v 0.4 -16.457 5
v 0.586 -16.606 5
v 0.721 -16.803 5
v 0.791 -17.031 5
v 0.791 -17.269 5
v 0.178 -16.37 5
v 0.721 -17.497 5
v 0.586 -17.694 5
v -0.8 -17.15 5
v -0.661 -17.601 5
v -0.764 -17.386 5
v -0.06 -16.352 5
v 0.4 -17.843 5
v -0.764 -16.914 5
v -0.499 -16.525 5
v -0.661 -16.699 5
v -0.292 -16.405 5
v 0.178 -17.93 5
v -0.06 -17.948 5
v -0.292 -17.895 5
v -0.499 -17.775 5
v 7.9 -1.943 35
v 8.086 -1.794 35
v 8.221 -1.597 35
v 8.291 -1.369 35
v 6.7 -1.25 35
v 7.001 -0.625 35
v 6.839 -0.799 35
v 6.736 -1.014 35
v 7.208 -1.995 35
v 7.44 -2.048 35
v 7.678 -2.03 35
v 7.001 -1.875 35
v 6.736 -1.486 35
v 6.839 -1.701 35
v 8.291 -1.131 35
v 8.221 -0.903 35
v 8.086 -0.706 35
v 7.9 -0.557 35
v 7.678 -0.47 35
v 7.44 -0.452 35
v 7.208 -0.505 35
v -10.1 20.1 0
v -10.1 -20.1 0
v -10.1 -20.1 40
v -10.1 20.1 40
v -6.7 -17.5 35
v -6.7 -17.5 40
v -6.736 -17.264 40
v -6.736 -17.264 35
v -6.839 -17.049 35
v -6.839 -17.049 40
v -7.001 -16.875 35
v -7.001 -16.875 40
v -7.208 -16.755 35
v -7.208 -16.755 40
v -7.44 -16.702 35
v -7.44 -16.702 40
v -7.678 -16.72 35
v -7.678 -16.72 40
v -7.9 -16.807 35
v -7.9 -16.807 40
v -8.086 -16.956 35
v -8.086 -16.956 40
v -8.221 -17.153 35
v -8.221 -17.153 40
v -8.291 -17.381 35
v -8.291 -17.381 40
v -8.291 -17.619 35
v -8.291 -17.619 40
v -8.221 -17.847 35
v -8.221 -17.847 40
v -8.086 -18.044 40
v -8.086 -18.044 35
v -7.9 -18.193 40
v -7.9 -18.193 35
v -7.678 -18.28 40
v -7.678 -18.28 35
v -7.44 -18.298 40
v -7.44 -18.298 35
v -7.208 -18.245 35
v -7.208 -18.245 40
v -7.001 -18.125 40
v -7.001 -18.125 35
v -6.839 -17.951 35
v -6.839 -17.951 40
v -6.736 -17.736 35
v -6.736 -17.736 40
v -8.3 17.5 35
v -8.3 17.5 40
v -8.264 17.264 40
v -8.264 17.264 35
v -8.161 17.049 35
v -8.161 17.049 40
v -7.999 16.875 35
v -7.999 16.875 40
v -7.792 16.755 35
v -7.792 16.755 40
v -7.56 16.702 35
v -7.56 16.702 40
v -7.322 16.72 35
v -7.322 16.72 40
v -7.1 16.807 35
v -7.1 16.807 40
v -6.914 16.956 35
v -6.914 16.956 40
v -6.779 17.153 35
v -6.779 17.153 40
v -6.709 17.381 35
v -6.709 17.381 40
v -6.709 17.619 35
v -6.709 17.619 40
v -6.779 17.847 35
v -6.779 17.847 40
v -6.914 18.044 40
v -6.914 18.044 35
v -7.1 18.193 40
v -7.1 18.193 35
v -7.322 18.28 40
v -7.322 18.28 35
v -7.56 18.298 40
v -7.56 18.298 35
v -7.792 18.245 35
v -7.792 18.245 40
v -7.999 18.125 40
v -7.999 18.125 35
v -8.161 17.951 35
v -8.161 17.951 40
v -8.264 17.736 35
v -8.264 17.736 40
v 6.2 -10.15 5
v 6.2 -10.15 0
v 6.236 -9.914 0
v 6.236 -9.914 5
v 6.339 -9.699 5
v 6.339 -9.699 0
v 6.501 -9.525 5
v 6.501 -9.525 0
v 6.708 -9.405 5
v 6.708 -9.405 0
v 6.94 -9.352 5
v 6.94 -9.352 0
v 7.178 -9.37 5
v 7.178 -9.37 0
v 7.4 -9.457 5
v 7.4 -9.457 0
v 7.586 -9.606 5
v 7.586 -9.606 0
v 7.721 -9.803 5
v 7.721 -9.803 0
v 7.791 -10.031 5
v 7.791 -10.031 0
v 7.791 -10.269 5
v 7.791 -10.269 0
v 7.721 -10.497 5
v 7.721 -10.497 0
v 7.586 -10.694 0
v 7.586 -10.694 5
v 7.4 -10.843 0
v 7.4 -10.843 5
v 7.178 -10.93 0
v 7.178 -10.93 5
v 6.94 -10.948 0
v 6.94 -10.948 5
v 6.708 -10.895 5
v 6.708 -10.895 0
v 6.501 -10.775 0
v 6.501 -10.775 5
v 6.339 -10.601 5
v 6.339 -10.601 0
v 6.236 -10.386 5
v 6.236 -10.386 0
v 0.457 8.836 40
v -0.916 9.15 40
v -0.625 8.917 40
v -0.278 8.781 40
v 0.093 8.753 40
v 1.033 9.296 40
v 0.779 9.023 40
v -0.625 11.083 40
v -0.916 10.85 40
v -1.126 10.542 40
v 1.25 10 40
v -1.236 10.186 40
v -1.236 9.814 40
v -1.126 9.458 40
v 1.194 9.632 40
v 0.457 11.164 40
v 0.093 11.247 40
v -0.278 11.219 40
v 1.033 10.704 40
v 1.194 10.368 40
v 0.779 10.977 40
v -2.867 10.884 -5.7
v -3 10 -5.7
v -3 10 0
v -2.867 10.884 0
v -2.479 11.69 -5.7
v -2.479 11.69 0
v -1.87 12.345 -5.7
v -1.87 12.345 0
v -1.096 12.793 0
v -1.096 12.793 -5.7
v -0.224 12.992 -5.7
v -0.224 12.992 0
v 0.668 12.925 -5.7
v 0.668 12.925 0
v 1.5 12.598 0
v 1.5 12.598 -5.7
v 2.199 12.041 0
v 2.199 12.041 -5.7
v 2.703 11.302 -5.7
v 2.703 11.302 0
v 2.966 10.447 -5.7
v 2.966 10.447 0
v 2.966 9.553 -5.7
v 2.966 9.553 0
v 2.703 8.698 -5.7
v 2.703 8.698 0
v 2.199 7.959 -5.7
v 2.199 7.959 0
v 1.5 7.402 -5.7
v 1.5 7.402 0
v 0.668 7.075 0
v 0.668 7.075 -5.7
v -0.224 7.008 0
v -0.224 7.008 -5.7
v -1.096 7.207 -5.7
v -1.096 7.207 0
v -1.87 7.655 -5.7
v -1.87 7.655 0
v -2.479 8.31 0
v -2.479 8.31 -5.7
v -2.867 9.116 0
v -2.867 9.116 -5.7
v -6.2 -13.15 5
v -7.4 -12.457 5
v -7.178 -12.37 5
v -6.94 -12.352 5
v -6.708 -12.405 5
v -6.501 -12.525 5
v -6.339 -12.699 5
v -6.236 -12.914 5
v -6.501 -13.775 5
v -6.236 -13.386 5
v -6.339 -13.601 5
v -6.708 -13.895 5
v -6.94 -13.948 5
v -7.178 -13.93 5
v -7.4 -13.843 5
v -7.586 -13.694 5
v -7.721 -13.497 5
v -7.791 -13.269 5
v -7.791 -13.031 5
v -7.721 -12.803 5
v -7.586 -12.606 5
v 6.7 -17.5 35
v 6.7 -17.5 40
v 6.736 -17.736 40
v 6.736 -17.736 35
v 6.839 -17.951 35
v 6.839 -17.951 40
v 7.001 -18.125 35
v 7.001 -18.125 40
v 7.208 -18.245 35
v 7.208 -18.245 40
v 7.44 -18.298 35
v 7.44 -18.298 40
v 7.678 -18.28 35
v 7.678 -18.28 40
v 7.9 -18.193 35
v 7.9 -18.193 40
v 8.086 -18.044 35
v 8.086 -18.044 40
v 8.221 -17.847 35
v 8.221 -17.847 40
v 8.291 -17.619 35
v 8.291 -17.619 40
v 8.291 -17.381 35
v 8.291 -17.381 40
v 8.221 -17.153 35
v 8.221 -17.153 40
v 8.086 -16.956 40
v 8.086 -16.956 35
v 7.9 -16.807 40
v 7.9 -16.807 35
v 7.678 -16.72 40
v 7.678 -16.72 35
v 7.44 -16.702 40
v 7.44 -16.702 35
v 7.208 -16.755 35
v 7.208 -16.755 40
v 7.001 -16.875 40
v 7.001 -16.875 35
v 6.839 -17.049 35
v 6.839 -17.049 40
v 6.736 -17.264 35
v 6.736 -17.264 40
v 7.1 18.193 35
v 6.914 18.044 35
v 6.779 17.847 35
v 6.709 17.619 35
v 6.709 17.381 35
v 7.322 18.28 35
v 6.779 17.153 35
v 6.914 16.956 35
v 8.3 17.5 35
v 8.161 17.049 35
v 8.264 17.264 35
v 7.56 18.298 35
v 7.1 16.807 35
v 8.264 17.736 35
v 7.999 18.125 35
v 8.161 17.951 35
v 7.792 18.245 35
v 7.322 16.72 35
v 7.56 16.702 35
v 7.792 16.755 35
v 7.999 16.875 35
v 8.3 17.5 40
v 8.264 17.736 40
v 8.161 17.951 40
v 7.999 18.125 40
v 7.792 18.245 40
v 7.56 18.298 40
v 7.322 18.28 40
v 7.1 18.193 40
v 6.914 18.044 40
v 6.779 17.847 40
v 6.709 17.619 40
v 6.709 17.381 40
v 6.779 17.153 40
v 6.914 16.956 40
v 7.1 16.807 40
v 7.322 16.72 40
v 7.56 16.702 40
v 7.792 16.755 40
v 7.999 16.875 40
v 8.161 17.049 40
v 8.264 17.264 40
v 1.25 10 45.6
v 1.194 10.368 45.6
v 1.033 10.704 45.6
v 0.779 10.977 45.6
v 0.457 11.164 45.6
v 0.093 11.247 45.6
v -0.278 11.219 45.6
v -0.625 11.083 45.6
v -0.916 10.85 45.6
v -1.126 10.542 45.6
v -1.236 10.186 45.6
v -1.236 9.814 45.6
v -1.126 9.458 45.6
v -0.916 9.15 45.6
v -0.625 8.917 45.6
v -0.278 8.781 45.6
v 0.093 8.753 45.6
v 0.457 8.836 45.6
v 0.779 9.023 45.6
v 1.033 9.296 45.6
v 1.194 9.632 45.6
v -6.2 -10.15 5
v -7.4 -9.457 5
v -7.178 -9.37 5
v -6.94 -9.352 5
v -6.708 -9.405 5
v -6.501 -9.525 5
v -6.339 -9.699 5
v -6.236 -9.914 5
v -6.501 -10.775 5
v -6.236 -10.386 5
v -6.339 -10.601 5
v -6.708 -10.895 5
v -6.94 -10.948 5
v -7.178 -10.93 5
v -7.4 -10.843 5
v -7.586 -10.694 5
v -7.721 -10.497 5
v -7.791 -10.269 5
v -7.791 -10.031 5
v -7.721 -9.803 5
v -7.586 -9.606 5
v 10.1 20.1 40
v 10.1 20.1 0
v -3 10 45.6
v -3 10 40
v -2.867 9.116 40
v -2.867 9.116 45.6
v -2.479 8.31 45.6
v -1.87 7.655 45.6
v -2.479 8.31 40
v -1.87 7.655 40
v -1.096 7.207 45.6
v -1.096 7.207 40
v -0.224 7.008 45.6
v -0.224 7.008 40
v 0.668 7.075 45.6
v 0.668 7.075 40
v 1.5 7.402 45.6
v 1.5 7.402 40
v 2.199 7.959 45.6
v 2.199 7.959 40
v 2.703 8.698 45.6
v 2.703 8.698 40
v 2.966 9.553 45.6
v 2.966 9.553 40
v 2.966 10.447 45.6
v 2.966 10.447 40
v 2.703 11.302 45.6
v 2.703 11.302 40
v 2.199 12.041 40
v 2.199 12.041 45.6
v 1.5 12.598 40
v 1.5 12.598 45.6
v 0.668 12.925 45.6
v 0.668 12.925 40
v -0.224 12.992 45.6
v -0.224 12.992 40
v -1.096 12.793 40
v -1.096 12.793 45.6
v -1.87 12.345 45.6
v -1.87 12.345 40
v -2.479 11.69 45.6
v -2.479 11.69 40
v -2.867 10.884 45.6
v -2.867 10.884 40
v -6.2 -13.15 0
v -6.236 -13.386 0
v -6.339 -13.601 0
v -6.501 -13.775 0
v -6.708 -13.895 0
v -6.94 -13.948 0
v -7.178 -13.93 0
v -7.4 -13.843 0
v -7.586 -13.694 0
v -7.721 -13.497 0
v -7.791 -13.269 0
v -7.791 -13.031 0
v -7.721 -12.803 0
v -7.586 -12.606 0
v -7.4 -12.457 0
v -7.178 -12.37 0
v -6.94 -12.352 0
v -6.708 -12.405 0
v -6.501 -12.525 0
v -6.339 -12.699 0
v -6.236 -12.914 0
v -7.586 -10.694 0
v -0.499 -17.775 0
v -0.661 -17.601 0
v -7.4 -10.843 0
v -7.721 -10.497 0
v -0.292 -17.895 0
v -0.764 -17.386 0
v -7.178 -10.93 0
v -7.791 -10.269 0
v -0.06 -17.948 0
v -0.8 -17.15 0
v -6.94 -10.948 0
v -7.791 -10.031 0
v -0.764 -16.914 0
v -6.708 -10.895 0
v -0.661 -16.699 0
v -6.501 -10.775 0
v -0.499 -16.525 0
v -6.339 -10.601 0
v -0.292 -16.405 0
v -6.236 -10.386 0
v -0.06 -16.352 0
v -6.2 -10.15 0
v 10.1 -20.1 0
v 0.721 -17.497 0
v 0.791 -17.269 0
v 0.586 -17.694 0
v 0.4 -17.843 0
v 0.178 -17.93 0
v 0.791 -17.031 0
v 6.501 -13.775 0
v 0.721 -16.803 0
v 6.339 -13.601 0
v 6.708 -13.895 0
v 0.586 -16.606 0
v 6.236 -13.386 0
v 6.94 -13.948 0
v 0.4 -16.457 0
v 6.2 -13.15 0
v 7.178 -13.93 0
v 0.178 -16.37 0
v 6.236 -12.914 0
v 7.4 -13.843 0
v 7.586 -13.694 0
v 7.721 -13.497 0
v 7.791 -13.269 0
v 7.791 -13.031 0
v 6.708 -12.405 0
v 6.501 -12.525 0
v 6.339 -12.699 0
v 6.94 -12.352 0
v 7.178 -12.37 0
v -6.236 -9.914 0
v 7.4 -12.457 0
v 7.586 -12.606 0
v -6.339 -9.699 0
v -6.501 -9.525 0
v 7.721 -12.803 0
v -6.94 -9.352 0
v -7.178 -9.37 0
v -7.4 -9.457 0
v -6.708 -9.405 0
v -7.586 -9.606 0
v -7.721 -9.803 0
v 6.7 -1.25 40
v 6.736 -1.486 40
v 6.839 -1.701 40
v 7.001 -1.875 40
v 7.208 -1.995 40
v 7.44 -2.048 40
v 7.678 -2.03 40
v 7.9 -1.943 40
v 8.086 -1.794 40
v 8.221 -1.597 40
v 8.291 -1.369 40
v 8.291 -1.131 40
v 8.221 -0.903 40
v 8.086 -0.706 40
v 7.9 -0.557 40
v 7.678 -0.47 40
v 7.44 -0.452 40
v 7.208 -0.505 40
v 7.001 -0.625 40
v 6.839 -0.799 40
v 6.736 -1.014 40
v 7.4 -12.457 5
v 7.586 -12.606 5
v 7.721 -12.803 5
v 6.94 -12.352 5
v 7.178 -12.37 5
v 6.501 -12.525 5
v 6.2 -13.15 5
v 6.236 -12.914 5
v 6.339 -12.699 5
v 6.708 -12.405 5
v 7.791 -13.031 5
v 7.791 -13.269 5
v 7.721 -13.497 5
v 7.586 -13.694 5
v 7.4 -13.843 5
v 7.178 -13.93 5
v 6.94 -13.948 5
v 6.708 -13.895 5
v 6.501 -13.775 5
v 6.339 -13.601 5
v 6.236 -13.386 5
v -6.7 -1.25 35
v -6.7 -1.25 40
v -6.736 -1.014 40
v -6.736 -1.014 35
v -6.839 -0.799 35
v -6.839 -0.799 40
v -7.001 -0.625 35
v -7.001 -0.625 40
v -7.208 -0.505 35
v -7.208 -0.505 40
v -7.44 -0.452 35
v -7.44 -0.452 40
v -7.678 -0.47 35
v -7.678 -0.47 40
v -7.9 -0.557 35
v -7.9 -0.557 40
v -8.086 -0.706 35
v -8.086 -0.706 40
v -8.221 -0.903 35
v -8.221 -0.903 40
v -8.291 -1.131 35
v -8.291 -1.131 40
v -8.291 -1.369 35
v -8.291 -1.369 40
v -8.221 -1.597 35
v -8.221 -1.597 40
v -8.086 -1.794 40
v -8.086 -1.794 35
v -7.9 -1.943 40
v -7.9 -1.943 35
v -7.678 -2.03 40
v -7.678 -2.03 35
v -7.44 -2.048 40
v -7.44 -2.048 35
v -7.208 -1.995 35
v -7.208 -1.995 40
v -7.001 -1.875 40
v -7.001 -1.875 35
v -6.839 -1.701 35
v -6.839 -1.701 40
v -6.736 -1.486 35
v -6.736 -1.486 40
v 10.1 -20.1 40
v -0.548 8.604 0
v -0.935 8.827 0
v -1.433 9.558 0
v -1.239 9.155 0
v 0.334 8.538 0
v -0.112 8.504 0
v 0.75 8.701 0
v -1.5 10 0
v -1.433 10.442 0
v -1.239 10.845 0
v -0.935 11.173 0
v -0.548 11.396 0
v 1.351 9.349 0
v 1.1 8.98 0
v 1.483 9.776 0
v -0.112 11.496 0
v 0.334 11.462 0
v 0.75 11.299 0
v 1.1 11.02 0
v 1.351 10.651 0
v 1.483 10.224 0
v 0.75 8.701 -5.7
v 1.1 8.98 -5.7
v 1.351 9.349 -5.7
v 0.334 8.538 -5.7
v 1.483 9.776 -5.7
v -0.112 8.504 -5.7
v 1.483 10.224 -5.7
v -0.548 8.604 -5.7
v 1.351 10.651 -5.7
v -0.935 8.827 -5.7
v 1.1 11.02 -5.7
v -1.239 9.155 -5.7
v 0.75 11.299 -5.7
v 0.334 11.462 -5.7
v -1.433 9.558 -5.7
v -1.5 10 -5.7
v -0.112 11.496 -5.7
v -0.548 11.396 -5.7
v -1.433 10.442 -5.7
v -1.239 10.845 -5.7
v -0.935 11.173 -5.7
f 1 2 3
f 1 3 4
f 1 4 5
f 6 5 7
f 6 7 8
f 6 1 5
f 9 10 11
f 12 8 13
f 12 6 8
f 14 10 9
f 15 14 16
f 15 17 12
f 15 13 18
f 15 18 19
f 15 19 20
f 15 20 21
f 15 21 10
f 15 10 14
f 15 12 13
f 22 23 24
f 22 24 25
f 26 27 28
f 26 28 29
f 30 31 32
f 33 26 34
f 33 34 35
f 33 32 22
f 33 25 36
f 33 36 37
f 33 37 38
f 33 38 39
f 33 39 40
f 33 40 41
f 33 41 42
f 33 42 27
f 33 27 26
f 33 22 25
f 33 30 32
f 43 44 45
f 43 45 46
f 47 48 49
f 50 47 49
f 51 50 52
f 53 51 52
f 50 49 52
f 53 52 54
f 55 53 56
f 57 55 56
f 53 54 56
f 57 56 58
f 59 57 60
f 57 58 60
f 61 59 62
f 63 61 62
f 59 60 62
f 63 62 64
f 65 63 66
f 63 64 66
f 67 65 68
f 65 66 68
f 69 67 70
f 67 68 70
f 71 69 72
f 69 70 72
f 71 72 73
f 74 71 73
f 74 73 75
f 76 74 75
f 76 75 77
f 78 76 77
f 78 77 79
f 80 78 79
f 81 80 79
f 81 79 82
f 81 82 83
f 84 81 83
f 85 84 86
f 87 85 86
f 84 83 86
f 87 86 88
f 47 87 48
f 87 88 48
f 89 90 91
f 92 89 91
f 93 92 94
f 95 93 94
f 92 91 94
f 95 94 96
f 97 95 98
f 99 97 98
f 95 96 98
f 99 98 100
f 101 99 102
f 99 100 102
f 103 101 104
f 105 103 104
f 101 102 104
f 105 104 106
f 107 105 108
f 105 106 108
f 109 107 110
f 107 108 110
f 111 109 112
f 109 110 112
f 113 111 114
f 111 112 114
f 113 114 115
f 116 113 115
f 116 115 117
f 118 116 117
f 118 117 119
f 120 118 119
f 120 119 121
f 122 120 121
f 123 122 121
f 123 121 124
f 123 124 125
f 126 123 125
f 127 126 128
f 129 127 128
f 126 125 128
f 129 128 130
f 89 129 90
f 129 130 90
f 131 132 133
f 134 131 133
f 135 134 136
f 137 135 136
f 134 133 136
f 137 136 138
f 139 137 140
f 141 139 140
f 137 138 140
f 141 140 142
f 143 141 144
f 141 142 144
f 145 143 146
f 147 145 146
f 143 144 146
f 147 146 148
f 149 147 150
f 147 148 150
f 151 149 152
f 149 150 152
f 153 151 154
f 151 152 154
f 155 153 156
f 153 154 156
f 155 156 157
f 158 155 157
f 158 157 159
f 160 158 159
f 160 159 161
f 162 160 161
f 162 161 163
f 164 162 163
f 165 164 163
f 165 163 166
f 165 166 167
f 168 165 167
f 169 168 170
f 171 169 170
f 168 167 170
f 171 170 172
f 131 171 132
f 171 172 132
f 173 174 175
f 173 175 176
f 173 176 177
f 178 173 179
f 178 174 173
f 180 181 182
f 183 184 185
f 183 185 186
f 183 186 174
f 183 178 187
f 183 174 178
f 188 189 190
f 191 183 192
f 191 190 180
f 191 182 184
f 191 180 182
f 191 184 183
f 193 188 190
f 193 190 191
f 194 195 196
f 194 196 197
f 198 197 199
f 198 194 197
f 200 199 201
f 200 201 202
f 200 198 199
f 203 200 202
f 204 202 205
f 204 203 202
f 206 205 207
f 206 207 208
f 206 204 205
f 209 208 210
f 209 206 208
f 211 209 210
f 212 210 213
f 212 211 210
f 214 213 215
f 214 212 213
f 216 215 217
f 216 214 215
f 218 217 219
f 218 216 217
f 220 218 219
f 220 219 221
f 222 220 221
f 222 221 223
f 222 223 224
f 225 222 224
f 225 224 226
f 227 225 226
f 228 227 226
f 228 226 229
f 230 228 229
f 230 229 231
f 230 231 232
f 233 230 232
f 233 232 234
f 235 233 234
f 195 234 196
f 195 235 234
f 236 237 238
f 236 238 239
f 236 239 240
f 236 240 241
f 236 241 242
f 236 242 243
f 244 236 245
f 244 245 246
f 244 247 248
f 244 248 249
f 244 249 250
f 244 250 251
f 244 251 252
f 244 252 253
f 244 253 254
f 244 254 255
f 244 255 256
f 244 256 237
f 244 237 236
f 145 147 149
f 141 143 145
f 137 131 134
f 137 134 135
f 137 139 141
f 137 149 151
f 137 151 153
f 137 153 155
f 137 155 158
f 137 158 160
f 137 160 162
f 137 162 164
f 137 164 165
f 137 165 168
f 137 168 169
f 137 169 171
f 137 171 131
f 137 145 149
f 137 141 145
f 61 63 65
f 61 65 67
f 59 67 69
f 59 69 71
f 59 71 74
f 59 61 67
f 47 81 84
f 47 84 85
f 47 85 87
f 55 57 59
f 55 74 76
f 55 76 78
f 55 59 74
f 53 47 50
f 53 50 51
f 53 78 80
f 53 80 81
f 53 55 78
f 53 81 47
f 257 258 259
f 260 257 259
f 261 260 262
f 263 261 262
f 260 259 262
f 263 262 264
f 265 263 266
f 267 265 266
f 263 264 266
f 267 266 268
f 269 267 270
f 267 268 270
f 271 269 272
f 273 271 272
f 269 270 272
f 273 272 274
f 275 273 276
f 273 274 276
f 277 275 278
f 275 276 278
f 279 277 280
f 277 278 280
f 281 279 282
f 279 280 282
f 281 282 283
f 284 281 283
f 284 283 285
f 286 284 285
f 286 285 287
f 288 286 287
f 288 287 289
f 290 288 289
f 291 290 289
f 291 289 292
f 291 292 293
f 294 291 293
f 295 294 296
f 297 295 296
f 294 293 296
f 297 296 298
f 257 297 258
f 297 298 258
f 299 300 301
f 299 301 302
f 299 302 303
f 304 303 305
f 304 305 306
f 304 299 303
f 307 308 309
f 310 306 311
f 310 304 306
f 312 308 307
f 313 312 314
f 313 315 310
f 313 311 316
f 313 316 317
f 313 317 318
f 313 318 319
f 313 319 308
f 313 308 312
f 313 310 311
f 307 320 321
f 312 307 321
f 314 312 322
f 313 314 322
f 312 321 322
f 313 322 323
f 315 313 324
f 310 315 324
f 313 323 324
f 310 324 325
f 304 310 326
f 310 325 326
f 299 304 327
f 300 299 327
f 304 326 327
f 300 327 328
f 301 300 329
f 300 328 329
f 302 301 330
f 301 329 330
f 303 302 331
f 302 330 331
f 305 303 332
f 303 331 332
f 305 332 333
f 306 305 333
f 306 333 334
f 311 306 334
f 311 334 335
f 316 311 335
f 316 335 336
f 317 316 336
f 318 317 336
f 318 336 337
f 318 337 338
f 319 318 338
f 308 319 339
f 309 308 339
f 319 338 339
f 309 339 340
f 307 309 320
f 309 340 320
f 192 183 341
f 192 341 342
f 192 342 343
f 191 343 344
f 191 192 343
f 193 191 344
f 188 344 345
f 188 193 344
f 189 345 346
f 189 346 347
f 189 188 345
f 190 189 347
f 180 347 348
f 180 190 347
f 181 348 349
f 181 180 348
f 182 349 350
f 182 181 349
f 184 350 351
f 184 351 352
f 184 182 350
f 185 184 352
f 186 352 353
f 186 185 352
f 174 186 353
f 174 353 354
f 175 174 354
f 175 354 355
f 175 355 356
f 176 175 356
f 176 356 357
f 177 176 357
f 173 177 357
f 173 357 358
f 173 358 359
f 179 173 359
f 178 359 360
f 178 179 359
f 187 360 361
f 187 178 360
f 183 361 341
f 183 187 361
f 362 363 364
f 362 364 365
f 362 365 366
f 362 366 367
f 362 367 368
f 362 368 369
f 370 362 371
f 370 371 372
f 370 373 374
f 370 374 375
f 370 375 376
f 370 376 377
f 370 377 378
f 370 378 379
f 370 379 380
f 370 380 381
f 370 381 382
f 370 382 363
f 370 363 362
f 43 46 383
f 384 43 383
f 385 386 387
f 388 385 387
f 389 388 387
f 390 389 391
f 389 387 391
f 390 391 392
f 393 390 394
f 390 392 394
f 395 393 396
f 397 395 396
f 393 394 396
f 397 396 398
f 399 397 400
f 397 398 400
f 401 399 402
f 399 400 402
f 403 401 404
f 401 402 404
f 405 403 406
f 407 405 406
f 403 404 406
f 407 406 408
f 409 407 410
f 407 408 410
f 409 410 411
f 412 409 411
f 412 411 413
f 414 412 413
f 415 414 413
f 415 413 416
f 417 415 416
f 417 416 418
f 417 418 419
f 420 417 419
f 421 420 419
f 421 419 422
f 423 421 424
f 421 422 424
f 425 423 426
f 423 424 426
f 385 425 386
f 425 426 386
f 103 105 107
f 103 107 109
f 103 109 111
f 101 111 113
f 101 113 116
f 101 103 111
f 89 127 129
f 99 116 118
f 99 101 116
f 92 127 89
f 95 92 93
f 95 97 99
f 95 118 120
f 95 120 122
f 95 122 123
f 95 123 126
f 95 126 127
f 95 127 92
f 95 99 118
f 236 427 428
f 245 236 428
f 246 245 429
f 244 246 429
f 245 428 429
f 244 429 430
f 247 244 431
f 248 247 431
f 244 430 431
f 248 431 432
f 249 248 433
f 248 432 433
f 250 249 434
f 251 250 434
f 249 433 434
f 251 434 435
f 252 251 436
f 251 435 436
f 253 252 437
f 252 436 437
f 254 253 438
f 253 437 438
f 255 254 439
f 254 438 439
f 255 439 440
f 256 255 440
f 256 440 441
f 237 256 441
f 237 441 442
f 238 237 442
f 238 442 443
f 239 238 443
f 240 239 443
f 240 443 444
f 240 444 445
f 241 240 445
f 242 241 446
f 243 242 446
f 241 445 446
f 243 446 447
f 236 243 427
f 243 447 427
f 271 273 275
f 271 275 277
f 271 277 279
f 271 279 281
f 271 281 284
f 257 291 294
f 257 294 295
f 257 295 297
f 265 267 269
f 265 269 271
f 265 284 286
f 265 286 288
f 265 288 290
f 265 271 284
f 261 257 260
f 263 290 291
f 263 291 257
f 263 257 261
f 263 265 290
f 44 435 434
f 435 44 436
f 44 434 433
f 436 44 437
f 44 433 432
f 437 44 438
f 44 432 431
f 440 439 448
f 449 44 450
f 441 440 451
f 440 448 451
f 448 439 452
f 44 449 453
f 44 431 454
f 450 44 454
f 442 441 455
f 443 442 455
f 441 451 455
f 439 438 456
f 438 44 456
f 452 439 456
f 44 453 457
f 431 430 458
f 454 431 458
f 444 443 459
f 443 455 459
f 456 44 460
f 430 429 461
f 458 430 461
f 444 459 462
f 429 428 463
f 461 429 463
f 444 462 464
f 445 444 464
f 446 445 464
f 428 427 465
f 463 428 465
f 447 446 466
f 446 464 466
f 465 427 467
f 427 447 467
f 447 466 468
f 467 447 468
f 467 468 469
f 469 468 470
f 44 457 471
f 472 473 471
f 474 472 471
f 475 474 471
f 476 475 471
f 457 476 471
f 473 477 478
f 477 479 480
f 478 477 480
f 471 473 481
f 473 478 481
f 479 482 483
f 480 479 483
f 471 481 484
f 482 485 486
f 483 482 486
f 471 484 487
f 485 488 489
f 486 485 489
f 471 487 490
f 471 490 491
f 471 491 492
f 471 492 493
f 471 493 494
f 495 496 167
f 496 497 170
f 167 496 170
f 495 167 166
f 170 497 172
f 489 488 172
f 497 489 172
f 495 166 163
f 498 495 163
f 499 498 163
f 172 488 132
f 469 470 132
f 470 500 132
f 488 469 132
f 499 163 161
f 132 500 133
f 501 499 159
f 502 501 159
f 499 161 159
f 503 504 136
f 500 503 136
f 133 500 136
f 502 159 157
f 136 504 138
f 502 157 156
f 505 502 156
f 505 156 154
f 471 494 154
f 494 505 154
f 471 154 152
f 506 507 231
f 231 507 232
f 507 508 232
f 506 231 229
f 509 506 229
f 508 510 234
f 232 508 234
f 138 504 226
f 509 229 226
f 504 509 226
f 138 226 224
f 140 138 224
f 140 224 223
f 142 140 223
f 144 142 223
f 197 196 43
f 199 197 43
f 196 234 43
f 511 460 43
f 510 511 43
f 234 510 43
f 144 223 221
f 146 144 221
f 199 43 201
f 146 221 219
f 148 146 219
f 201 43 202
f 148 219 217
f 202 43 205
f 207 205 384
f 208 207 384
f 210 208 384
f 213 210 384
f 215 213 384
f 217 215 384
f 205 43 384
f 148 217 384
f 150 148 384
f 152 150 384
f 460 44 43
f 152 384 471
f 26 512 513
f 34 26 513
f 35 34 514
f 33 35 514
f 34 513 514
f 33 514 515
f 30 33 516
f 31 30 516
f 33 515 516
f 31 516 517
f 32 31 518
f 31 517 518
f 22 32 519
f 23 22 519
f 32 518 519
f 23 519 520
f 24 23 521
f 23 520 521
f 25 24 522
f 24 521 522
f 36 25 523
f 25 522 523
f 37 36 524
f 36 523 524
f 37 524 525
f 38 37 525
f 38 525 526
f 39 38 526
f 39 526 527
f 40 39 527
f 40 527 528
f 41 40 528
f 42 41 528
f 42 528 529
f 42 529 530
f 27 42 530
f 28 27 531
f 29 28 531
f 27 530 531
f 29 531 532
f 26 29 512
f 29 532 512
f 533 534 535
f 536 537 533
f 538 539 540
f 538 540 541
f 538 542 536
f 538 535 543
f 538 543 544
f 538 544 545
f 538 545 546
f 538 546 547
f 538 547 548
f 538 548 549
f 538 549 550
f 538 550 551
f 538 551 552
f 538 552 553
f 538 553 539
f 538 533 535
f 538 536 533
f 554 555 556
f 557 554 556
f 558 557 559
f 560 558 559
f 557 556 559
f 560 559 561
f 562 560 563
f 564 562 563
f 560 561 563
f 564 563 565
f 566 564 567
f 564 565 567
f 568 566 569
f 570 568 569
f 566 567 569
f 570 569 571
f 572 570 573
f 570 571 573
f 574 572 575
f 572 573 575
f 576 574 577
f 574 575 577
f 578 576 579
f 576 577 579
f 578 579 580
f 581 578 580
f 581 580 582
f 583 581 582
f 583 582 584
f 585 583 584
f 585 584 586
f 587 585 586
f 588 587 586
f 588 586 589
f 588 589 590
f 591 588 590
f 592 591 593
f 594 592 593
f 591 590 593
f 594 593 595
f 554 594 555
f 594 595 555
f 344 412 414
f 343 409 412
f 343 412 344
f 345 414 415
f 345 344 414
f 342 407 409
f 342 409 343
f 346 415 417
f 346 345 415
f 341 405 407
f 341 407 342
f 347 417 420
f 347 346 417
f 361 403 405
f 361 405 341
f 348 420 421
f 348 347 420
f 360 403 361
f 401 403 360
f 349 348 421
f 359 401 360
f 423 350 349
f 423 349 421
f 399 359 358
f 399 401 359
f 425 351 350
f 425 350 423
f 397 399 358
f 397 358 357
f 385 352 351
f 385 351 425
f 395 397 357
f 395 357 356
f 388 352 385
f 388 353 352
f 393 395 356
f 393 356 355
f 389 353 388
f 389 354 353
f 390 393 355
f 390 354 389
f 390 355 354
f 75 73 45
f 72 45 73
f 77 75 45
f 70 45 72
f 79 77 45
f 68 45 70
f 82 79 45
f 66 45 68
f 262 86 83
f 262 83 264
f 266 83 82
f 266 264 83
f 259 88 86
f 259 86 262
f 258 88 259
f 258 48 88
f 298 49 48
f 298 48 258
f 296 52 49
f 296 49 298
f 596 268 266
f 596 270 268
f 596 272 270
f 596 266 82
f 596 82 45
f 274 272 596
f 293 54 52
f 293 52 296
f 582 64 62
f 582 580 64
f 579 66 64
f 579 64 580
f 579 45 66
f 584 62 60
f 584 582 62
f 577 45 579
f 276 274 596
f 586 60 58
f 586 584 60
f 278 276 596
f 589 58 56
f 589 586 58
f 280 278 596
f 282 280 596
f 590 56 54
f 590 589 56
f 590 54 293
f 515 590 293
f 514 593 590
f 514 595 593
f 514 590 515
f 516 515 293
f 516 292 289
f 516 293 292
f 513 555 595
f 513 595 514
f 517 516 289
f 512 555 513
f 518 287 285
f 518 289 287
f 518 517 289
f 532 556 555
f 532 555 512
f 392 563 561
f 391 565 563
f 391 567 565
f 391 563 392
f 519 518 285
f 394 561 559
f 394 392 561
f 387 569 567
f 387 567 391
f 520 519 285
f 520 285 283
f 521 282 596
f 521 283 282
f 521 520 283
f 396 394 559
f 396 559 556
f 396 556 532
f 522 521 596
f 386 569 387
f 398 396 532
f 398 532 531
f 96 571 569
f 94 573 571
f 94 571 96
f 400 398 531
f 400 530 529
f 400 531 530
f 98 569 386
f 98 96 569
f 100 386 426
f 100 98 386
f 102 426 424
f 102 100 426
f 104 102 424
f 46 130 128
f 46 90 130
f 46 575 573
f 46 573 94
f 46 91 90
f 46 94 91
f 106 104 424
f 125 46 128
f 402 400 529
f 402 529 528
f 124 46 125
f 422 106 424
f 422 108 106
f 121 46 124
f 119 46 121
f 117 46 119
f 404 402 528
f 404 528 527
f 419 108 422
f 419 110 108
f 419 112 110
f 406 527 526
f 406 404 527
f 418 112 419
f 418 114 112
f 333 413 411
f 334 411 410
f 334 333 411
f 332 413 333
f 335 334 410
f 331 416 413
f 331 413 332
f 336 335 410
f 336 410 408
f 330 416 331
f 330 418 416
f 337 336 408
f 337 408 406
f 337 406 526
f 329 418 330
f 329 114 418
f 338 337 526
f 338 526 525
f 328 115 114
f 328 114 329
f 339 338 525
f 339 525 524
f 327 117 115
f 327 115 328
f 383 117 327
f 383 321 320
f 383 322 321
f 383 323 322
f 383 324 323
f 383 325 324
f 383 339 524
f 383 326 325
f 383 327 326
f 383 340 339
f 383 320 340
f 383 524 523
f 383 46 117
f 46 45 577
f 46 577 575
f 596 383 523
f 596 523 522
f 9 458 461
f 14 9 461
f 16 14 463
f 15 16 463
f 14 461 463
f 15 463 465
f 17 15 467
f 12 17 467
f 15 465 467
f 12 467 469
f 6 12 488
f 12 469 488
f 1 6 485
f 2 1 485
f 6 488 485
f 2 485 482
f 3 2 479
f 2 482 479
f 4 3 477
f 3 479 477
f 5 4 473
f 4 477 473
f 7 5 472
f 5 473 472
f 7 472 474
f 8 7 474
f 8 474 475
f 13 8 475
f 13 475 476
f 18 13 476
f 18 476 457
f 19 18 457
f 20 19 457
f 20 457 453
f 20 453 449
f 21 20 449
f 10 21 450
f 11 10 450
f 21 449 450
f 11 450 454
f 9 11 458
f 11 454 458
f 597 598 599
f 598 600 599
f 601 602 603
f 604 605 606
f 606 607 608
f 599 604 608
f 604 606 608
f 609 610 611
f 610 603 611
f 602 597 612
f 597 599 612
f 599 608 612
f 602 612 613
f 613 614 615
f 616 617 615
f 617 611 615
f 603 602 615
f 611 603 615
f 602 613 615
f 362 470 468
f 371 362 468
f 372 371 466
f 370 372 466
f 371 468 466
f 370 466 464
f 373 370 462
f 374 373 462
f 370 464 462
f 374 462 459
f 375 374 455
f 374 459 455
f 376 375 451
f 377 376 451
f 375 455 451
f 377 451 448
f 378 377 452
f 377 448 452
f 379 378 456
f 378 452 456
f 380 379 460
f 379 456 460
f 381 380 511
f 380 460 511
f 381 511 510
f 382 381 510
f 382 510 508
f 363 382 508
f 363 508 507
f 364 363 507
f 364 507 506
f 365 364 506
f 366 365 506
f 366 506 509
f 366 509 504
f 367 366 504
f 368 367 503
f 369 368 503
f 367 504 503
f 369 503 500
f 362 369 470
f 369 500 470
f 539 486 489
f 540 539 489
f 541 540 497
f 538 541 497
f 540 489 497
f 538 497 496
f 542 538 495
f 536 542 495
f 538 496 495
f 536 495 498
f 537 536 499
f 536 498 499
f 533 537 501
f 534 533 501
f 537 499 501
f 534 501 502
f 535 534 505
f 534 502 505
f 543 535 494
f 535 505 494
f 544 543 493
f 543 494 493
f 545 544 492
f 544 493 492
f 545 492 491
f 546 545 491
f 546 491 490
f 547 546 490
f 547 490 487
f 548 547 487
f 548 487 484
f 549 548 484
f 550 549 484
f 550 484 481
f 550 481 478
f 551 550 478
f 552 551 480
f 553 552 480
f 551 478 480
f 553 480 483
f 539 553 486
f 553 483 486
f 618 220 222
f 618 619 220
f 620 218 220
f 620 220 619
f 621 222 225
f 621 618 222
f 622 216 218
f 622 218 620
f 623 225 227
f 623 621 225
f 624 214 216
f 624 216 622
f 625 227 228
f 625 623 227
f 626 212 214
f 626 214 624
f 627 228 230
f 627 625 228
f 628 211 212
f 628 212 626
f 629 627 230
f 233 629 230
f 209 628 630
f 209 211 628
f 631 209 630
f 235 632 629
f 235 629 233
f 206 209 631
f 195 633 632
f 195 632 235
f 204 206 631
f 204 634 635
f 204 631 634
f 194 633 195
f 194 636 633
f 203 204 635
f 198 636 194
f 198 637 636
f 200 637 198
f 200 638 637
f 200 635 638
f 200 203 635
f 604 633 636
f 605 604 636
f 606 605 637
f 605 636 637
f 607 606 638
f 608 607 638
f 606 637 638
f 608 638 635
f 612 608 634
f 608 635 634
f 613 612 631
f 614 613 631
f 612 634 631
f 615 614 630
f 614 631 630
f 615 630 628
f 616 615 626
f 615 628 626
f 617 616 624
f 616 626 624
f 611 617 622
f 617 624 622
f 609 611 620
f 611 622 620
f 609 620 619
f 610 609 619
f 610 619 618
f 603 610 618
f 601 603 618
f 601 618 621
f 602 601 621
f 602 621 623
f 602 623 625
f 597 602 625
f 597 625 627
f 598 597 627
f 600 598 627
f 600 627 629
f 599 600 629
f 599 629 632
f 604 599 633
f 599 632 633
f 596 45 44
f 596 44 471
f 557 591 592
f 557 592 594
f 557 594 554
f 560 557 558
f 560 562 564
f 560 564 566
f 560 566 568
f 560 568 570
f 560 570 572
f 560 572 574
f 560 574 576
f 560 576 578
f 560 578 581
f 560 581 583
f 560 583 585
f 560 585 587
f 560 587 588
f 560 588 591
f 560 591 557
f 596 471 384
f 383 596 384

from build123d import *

# Parameters (mm, degrees)
SKETCH1_W           = 20.2
SKETCH1_H           = 40.2
BOSS_EXTRUDE1_DEPTH = 40
SKETCH2_R           = 0.8
CUT_EXTRUDE1_DEPTH  = 5
SKETCH3_R           = 3
SKETCH3_R_2         = 1.25
BOSS_EXTRUDE2_DEPTH = 5.6
BOSS_EXTRUDE3_START = 5.7
SKETCH4_R           = 3
SKETCH4_R_2         = 1.5
BOSS_EXTRUDE3_DEPTH = 5.7
SKETCH5_R           = 0.8
CUT_EXTRUDE2_DEPTH  = 5


with BuildPart() as part:
    # Sketch1 → Boss-Extrude1 (new body)
    with BuildSketch(Plane.XY):
        Rectangle(SKETCH1_W, SKETCH1_H)
    extrude(amount=BOSS_EXTRUDE1_DEPTH)

    # Sketch2 → Cut-Extrude1 (cut)
    with BuildSketch(Plane.XY.offset(40)):
        with Locations((-7.5, -17.5)):
            Circle(SKETCH2_R)
        with Locations(Location((-7.5, 17.5, 0), (0, 0, 180))):
            Circle(SKETCH2_R)
        with Locations(Location((7.5, -17.5, 0), (0, 0, 180))):
            Circle(SKETCH2_R)
        with Locations((7.5, 17.5)):
            Circle(SKETCH2_R)
        with Locations((-7.5, -1.25)):
            Circle(SKETCH2_R)
        with Locations(Location((7.5, -1.25, 0), (0, 0, 180))):
            Circle(SKETCH2_R)
    extrude(amount=-CUT_EXTRUDE1_DEPTH, mode=Mode.SUBTRACT)

    # Sketch3 → Boss-Extrude2 (add)
    with BuildSketch(Plane.XY.offset(40)):
        with Locations(Location((0, 10, 0), (0, 0, 180))):
            Circle(SKETCH3_R)
        with Locations((0, 10)):
            Circle(SKETCH3_R_2, mode=Mode.SUBTRACT)
    extrude(amount=BOSS_EXTRUDE2_DEPTH)

    # Sketch4 → Boss-Extrude3 (add)
    with BuildSketch(Plane(origin=(0, 0, 0), x_dir=(-1, 0, 0), z_dir=(0, 0, -1)).offset(BOSS_EXTRUDE3_START)):
        with Locations((0, 10)):
            Circle(SKETCH4_R)
        with Locations((0, 10)):
            Circle(SKETCH4_R_2, mode=Mode.SUBTRACT)
    extrude(amount=-BOSS_EXTRUDE3_DEPTH)

    # Sketch5 → Cut-Extrude2 (cut)
    with BuildSketch(Plane(origin=(0, 0, 0), x_dir=(-1, 0, 0), z_dir=(0, 0, -1))):
        with Locations((0, -17.15)):
            Circle(SKETCH5_R)
        with Locations((-7, -13.15)):
            Circle(SKETCH5_R)
        with Locations((-7, -10.15)):
            Circle(SKETCH5_R)
        with Locations(Location((7, -13.15, 0), (0, 0, 180))):
            Circle(SKETCH5_R)
        with Locations(Location((7, -10.15, 0), (0, 0, 180))):
            Circle(SKETCH5_R)
    extrude(amount=-CUT_EXTRUDE2_DEPTH, mode=Mode.SUBTRACT)


solid = part.part
